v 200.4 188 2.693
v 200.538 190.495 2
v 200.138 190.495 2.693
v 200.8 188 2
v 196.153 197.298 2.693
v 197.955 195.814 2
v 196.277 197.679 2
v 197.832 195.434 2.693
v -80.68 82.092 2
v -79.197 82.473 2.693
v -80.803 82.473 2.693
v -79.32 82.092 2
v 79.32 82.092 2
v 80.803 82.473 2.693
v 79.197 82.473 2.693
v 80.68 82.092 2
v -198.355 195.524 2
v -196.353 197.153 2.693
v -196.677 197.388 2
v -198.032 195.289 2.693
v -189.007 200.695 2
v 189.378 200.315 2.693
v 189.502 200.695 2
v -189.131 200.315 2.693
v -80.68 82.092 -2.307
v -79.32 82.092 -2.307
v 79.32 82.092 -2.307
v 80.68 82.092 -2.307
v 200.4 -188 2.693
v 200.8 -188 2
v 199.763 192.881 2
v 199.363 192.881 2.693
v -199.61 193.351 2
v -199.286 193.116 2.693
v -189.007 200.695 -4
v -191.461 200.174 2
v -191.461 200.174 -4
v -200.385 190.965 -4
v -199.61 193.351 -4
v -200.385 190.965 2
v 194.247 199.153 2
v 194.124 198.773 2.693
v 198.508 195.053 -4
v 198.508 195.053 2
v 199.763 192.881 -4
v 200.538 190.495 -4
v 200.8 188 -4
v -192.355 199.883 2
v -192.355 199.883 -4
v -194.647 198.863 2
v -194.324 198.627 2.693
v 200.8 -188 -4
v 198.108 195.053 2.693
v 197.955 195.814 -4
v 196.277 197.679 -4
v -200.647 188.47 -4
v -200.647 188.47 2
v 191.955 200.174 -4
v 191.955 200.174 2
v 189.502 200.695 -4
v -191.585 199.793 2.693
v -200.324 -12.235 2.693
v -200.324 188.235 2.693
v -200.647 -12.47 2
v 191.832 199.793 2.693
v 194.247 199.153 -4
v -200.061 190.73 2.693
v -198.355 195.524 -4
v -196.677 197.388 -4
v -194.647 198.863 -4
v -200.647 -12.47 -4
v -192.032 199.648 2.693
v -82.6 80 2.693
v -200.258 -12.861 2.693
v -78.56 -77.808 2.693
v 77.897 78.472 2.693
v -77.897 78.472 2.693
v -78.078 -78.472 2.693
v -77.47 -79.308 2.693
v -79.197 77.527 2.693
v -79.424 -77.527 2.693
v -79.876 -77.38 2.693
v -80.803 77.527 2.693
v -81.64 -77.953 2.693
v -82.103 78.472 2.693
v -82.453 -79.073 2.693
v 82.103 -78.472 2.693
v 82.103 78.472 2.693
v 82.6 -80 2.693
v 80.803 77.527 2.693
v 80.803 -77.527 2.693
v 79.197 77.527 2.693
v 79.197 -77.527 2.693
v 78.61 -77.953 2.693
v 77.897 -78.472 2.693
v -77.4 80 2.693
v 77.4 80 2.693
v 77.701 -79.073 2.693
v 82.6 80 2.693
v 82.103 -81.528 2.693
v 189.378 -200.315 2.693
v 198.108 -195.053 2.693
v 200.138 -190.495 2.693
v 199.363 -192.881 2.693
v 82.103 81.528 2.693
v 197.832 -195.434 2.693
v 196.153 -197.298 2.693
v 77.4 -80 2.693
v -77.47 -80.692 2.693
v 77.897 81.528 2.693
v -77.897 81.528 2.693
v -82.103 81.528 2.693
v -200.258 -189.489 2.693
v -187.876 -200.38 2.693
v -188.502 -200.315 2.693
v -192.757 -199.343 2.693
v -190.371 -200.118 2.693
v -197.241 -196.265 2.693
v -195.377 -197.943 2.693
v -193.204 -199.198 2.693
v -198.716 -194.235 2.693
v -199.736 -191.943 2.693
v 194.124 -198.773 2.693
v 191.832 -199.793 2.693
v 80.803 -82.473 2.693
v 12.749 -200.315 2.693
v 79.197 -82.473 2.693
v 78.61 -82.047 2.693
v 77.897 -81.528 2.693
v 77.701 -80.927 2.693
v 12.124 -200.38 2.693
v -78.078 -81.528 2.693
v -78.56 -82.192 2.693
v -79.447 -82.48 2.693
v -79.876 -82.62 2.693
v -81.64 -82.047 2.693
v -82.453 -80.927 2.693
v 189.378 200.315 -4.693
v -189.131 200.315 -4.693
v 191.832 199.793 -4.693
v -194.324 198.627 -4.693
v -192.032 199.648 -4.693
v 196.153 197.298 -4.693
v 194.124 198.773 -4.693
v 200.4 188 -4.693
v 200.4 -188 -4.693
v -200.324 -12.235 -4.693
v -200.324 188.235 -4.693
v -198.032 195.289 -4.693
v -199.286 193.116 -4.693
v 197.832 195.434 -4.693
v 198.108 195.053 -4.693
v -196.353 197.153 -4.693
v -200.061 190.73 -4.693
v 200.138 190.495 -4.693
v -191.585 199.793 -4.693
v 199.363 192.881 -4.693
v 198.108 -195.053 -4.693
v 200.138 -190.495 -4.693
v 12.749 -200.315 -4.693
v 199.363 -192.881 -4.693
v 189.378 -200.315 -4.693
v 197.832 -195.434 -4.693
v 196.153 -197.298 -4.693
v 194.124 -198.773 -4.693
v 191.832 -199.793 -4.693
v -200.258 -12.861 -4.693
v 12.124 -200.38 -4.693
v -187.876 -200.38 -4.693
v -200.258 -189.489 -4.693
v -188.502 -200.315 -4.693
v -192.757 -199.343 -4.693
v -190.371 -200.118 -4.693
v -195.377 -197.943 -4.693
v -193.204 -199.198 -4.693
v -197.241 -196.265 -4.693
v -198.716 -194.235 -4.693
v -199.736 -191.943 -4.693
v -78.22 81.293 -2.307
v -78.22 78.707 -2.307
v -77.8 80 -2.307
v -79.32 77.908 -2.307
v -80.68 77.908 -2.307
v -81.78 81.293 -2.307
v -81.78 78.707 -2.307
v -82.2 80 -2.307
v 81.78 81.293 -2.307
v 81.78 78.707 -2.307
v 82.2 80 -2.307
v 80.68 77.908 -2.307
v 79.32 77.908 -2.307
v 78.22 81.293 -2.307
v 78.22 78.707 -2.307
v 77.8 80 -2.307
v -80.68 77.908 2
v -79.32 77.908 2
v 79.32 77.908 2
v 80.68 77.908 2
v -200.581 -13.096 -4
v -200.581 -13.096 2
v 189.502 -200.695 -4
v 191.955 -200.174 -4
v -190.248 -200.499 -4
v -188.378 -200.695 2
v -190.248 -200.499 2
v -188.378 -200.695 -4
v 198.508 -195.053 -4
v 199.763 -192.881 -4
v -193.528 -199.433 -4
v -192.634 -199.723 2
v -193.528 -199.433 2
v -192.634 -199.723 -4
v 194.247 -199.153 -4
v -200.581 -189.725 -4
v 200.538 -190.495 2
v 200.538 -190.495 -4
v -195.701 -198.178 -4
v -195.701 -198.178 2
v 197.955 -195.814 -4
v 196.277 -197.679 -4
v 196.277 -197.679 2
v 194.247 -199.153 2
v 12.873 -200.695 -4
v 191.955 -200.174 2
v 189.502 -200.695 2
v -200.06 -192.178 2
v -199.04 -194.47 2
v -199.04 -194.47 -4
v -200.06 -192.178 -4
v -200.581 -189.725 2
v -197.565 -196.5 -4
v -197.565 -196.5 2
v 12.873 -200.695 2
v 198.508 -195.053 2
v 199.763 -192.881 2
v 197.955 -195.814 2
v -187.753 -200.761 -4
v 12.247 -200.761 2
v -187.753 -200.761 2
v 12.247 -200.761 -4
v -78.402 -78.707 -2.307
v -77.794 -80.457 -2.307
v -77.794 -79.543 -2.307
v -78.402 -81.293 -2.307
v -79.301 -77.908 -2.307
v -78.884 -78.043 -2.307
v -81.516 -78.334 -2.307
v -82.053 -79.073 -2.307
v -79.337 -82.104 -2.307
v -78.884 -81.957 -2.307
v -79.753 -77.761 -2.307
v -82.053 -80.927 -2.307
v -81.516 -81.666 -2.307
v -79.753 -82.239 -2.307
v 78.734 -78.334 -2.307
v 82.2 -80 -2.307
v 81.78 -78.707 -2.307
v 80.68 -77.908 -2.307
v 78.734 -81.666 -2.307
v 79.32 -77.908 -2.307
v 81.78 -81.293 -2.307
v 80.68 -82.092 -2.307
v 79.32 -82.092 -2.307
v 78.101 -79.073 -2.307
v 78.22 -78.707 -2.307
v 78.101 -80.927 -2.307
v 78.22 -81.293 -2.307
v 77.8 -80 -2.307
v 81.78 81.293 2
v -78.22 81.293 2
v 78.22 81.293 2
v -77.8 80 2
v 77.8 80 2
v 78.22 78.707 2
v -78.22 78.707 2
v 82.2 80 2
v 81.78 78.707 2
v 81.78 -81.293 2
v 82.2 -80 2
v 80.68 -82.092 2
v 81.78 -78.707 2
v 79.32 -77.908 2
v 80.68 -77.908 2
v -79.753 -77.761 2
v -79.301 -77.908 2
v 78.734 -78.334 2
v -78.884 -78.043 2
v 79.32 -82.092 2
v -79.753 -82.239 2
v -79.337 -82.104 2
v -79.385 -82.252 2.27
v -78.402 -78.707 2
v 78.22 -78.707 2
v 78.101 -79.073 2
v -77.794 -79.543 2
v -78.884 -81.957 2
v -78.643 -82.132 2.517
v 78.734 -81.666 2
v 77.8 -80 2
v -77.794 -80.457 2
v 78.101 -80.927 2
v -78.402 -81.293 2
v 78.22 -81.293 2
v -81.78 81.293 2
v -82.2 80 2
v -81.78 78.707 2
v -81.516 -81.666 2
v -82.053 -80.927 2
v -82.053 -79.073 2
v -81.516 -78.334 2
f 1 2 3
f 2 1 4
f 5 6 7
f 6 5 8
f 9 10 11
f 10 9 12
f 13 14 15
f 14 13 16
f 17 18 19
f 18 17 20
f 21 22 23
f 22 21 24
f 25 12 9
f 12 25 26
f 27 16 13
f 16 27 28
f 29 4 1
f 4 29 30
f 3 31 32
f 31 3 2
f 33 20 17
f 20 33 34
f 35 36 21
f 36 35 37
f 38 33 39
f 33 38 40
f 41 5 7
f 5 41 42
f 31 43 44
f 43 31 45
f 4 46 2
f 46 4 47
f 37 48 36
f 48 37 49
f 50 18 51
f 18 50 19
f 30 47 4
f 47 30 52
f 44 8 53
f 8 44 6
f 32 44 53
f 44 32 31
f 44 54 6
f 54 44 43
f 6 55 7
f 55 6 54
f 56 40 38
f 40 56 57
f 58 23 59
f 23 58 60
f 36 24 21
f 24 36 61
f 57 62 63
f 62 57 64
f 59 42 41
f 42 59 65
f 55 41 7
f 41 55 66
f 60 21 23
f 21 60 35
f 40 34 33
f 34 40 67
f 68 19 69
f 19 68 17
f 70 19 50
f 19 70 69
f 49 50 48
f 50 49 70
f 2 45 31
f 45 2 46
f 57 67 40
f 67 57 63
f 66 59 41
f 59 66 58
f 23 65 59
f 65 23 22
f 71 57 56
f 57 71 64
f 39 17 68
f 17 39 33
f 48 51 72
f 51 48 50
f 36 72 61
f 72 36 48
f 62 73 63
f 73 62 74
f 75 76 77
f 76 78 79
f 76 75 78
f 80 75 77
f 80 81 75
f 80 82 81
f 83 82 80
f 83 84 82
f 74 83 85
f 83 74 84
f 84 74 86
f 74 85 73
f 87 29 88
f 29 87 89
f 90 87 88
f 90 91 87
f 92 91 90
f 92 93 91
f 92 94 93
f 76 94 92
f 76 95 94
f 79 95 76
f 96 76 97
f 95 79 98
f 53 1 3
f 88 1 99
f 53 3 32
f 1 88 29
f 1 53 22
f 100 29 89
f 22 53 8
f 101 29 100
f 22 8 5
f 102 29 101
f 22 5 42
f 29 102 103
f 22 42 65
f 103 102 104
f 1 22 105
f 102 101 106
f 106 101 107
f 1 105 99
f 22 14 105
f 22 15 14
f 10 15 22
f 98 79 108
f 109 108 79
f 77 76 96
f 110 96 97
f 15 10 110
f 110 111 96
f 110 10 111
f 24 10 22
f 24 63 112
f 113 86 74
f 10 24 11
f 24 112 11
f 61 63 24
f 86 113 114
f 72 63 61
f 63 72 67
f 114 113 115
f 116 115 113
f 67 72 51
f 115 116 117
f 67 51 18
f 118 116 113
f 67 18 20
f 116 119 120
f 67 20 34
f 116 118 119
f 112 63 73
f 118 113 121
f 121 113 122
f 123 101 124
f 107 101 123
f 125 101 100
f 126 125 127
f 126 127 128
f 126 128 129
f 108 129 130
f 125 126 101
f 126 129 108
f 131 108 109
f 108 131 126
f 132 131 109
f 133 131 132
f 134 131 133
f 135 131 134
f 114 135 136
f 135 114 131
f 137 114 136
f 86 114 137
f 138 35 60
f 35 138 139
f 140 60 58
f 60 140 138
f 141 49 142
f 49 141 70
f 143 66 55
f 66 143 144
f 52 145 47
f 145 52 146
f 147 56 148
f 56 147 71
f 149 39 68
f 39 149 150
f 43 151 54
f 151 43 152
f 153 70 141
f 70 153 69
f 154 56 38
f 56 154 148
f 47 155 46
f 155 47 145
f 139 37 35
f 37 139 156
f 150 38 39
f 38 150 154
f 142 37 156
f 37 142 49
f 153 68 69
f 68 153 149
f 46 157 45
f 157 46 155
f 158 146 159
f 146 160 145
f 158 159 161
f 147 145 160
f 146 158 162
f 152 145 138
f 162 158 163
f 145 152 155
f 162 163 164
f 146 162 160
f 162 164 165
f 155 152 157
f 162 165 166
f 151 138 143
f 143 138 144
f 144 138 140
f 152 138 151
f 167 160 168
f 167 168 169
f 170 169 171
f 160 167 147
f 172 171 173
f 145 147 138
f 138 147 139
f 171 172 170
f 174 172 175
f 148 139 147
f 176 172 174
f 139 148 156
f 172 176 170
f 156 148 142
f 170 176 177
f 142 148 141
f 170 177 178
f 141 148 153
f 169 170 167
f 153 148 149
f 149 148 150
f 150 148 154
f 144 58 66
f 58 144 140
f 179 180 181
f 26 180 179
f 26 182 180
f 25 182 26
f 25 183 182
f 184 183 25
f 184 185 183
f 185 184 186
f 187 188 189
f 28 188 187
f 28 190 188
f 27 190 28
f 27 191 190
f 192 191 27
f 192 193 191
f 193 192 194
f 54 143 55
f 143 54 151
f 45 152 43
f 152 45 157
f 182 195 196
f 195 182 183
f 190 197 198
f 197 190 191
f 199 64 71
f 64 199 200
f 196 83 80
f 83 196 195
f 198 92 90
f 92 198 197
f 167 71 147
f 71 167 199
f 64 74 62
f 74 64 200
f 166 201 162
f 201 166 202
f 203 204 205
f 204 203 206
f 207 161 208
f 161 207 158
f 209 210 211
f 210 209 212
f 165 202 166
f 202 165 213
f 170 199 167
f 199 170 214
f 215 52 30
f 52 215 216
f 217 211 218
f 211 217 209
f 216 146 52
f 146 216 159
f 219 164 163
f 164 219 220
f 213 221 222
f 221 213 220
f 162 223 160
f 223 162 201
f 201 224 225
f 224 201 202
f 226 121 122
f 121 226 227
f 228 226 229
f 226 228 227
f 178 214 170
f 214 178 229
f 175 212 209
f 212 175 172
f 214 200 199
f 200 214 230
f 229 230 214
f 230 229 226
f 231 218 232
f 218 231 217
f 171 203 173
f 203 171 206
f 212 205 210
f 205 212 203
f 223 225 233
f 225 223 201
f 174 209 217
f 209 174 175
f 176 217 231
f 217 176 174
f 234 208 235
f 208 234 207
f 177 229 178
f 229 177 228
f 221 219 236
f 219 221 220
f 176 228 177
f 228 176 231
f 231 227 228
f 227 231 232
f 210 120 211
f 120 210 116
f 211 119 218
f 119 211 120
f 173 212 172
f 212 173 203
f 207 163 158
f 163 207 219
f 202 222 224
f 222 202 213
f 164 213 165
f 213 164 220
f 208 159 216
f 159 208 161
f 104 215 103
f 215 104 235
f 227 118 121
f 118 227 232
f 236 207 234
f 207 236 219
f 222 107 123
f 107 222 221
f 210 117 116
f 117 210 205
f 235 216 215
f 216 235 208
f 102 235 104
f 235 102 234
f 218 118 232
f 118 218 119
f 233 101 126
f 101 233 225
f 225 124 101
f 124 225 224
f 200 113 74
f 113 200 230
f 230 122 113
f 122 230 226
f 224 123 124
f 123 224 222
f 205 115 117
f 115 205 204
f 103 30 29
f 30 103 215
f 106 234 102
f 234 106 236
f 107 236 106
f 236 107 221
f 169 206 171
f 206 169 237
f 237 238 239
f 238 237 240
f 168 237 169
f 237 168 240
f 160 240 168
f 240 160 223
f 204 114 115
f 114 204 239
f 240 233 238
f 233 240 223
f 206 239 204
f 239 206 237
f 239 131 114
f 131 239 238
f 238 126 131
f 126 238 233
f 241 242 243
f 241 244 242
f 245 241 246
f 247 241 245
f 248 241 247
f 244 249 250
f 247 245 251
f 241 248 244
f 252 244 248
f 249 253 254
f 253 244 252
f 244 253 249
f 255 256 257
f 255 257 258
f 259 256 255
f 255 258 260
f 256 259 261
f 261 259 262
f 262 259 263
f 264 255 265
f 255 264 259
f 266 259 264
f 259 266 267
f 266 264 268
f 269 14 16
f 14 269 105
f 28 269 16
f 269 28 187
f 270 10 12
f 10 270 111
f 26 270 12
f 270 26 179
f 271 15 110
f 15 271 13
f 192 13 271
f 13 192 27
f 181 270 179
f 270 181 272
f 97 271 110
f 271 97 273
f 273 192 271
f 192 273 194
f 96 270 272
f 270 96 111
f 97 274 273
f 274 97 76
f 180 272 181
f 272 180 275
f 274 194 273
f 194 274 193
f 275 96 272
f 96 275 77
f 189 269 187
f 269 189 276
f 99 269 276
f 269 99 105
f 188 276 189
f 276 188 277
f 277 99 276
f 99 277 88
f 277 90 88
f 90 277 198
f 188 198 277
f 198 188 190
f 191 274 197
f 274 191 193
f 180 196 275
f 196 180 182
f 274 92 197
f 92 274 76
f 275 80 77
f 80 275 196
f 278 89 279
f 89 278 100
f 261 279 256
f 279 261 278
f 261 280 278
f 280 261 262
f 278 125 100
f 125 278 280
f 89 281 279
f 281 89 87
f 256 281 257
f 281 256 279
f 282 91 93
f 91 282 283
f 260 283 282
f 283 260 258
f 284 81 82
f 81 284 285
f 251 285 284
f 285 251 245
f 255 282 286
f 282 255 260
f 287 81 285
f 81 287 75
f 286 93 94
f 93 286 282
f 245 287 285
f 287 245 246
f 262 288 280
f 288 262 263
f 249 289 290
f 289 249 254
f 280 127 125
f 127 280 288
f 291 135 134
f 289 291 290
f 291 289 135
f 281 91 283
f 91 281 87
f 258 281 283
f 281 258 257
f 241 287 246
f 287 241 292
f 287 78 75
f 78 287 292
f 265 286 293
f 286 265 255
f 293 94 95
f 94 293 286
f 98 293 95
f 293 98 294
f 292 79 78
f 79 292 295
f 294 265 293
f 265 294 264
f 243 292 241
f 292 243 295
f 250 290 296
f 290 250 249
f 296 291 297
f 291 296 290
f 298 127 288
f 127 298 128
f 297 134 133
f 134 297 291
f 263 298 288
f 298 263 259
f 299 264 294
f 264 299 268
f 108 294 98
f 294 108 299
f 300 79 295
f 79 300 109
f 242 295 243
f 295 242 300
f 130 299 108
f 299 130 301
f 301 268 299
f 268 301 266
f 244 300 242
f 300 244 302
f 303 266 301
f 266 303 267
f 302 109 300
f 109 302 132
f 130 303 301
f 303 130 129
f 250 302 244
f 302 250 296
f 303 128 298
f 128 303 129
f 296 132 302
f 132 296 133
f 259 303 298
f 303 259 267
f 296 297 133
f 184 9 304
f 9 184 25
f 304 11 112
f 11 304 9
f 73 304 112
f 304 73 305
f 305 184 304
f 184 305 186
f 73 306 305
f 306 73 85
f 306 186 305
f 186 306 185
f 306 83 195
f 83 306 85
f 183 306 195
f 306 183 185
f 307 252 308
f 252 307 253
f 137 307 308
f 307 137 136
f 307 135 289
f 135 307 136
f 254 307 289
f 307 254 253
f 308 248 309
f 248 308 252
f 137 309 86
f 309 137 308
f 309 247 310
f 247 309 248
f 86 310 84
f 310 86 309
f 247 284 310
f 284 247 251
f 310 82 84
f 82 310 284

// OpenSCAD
// Parameters
sheet_length = 200; //[100:400:1]
sheet_width = 200; //[100:400:1]
sheet_thickness = 2; //[1:6:0.5]
corner_radius = 12; //[6:24:1]
hole_diameter = 6; //[3:12:0.5]
hole_edge_offset = 20; //[10:40:1]
chamfer_size = 0.8; //[0.2:2:0.1]
overlap = 1; //[0.5:2:0.1]

// Base shapes
module sheet_body() {
  translate([0, 0, -sheet_thickness/2])
    cube([sheet_length, sheet_width, sheet_thickness], center=true);
}

module rounded_corners() {
  translate([sheet_length/2 - corner_radius, sheet_width/2 - corner_radius, 0])
    cylinder(r=corner_radius, h=sheet_thickness + 2*overlap, center=true);
}

module mounting_holes() {
  translate([sheet_length/2 - hole_edge_offset, sheet_width/2 - hole_edge_offset, 0])
    cylinder(r=hole_diameter/2, h=sheet_thickness + 4*overlap, center=true);
}

module chamfer_edges() {
  sphere(r=chamfer_size, center=true);
}

// Operations
module rounded_corners_all() {
  union() {
    rounded_corners();
    mirror([1, 0, 0]) rounded_corners();
    mirror([0, 1, 0]) rounded_corners();
    mirror([1, 1, 0]) rounded_corners();
  }
}

module sheet_with_rounded_corners() {
  minkowski() {
    sheet_body();
    rounded_corners_all();
  }
}

module mounting_holes_all() {
  union() {
    mounting_holes();
    mirror([1, 0, 0]) mounting_holes();
    mirror([0, 1, 0]) mounting_holes();
    mirror([1, 1, 0]) mounting_holes();
  }
}

module sheet_rounded_with_holes() {
  difference() {
    sheet_with_rounded_corners();
    mounting_holes_all();
  }
}

module sheet_rounded_holes_chamfered() {
  minkowski() {
    sheet_rounded_with_holes();
    chamfer_edges();
  }
}

// Final output
color("Silver") sheet_rounded_holes_chamfered();
